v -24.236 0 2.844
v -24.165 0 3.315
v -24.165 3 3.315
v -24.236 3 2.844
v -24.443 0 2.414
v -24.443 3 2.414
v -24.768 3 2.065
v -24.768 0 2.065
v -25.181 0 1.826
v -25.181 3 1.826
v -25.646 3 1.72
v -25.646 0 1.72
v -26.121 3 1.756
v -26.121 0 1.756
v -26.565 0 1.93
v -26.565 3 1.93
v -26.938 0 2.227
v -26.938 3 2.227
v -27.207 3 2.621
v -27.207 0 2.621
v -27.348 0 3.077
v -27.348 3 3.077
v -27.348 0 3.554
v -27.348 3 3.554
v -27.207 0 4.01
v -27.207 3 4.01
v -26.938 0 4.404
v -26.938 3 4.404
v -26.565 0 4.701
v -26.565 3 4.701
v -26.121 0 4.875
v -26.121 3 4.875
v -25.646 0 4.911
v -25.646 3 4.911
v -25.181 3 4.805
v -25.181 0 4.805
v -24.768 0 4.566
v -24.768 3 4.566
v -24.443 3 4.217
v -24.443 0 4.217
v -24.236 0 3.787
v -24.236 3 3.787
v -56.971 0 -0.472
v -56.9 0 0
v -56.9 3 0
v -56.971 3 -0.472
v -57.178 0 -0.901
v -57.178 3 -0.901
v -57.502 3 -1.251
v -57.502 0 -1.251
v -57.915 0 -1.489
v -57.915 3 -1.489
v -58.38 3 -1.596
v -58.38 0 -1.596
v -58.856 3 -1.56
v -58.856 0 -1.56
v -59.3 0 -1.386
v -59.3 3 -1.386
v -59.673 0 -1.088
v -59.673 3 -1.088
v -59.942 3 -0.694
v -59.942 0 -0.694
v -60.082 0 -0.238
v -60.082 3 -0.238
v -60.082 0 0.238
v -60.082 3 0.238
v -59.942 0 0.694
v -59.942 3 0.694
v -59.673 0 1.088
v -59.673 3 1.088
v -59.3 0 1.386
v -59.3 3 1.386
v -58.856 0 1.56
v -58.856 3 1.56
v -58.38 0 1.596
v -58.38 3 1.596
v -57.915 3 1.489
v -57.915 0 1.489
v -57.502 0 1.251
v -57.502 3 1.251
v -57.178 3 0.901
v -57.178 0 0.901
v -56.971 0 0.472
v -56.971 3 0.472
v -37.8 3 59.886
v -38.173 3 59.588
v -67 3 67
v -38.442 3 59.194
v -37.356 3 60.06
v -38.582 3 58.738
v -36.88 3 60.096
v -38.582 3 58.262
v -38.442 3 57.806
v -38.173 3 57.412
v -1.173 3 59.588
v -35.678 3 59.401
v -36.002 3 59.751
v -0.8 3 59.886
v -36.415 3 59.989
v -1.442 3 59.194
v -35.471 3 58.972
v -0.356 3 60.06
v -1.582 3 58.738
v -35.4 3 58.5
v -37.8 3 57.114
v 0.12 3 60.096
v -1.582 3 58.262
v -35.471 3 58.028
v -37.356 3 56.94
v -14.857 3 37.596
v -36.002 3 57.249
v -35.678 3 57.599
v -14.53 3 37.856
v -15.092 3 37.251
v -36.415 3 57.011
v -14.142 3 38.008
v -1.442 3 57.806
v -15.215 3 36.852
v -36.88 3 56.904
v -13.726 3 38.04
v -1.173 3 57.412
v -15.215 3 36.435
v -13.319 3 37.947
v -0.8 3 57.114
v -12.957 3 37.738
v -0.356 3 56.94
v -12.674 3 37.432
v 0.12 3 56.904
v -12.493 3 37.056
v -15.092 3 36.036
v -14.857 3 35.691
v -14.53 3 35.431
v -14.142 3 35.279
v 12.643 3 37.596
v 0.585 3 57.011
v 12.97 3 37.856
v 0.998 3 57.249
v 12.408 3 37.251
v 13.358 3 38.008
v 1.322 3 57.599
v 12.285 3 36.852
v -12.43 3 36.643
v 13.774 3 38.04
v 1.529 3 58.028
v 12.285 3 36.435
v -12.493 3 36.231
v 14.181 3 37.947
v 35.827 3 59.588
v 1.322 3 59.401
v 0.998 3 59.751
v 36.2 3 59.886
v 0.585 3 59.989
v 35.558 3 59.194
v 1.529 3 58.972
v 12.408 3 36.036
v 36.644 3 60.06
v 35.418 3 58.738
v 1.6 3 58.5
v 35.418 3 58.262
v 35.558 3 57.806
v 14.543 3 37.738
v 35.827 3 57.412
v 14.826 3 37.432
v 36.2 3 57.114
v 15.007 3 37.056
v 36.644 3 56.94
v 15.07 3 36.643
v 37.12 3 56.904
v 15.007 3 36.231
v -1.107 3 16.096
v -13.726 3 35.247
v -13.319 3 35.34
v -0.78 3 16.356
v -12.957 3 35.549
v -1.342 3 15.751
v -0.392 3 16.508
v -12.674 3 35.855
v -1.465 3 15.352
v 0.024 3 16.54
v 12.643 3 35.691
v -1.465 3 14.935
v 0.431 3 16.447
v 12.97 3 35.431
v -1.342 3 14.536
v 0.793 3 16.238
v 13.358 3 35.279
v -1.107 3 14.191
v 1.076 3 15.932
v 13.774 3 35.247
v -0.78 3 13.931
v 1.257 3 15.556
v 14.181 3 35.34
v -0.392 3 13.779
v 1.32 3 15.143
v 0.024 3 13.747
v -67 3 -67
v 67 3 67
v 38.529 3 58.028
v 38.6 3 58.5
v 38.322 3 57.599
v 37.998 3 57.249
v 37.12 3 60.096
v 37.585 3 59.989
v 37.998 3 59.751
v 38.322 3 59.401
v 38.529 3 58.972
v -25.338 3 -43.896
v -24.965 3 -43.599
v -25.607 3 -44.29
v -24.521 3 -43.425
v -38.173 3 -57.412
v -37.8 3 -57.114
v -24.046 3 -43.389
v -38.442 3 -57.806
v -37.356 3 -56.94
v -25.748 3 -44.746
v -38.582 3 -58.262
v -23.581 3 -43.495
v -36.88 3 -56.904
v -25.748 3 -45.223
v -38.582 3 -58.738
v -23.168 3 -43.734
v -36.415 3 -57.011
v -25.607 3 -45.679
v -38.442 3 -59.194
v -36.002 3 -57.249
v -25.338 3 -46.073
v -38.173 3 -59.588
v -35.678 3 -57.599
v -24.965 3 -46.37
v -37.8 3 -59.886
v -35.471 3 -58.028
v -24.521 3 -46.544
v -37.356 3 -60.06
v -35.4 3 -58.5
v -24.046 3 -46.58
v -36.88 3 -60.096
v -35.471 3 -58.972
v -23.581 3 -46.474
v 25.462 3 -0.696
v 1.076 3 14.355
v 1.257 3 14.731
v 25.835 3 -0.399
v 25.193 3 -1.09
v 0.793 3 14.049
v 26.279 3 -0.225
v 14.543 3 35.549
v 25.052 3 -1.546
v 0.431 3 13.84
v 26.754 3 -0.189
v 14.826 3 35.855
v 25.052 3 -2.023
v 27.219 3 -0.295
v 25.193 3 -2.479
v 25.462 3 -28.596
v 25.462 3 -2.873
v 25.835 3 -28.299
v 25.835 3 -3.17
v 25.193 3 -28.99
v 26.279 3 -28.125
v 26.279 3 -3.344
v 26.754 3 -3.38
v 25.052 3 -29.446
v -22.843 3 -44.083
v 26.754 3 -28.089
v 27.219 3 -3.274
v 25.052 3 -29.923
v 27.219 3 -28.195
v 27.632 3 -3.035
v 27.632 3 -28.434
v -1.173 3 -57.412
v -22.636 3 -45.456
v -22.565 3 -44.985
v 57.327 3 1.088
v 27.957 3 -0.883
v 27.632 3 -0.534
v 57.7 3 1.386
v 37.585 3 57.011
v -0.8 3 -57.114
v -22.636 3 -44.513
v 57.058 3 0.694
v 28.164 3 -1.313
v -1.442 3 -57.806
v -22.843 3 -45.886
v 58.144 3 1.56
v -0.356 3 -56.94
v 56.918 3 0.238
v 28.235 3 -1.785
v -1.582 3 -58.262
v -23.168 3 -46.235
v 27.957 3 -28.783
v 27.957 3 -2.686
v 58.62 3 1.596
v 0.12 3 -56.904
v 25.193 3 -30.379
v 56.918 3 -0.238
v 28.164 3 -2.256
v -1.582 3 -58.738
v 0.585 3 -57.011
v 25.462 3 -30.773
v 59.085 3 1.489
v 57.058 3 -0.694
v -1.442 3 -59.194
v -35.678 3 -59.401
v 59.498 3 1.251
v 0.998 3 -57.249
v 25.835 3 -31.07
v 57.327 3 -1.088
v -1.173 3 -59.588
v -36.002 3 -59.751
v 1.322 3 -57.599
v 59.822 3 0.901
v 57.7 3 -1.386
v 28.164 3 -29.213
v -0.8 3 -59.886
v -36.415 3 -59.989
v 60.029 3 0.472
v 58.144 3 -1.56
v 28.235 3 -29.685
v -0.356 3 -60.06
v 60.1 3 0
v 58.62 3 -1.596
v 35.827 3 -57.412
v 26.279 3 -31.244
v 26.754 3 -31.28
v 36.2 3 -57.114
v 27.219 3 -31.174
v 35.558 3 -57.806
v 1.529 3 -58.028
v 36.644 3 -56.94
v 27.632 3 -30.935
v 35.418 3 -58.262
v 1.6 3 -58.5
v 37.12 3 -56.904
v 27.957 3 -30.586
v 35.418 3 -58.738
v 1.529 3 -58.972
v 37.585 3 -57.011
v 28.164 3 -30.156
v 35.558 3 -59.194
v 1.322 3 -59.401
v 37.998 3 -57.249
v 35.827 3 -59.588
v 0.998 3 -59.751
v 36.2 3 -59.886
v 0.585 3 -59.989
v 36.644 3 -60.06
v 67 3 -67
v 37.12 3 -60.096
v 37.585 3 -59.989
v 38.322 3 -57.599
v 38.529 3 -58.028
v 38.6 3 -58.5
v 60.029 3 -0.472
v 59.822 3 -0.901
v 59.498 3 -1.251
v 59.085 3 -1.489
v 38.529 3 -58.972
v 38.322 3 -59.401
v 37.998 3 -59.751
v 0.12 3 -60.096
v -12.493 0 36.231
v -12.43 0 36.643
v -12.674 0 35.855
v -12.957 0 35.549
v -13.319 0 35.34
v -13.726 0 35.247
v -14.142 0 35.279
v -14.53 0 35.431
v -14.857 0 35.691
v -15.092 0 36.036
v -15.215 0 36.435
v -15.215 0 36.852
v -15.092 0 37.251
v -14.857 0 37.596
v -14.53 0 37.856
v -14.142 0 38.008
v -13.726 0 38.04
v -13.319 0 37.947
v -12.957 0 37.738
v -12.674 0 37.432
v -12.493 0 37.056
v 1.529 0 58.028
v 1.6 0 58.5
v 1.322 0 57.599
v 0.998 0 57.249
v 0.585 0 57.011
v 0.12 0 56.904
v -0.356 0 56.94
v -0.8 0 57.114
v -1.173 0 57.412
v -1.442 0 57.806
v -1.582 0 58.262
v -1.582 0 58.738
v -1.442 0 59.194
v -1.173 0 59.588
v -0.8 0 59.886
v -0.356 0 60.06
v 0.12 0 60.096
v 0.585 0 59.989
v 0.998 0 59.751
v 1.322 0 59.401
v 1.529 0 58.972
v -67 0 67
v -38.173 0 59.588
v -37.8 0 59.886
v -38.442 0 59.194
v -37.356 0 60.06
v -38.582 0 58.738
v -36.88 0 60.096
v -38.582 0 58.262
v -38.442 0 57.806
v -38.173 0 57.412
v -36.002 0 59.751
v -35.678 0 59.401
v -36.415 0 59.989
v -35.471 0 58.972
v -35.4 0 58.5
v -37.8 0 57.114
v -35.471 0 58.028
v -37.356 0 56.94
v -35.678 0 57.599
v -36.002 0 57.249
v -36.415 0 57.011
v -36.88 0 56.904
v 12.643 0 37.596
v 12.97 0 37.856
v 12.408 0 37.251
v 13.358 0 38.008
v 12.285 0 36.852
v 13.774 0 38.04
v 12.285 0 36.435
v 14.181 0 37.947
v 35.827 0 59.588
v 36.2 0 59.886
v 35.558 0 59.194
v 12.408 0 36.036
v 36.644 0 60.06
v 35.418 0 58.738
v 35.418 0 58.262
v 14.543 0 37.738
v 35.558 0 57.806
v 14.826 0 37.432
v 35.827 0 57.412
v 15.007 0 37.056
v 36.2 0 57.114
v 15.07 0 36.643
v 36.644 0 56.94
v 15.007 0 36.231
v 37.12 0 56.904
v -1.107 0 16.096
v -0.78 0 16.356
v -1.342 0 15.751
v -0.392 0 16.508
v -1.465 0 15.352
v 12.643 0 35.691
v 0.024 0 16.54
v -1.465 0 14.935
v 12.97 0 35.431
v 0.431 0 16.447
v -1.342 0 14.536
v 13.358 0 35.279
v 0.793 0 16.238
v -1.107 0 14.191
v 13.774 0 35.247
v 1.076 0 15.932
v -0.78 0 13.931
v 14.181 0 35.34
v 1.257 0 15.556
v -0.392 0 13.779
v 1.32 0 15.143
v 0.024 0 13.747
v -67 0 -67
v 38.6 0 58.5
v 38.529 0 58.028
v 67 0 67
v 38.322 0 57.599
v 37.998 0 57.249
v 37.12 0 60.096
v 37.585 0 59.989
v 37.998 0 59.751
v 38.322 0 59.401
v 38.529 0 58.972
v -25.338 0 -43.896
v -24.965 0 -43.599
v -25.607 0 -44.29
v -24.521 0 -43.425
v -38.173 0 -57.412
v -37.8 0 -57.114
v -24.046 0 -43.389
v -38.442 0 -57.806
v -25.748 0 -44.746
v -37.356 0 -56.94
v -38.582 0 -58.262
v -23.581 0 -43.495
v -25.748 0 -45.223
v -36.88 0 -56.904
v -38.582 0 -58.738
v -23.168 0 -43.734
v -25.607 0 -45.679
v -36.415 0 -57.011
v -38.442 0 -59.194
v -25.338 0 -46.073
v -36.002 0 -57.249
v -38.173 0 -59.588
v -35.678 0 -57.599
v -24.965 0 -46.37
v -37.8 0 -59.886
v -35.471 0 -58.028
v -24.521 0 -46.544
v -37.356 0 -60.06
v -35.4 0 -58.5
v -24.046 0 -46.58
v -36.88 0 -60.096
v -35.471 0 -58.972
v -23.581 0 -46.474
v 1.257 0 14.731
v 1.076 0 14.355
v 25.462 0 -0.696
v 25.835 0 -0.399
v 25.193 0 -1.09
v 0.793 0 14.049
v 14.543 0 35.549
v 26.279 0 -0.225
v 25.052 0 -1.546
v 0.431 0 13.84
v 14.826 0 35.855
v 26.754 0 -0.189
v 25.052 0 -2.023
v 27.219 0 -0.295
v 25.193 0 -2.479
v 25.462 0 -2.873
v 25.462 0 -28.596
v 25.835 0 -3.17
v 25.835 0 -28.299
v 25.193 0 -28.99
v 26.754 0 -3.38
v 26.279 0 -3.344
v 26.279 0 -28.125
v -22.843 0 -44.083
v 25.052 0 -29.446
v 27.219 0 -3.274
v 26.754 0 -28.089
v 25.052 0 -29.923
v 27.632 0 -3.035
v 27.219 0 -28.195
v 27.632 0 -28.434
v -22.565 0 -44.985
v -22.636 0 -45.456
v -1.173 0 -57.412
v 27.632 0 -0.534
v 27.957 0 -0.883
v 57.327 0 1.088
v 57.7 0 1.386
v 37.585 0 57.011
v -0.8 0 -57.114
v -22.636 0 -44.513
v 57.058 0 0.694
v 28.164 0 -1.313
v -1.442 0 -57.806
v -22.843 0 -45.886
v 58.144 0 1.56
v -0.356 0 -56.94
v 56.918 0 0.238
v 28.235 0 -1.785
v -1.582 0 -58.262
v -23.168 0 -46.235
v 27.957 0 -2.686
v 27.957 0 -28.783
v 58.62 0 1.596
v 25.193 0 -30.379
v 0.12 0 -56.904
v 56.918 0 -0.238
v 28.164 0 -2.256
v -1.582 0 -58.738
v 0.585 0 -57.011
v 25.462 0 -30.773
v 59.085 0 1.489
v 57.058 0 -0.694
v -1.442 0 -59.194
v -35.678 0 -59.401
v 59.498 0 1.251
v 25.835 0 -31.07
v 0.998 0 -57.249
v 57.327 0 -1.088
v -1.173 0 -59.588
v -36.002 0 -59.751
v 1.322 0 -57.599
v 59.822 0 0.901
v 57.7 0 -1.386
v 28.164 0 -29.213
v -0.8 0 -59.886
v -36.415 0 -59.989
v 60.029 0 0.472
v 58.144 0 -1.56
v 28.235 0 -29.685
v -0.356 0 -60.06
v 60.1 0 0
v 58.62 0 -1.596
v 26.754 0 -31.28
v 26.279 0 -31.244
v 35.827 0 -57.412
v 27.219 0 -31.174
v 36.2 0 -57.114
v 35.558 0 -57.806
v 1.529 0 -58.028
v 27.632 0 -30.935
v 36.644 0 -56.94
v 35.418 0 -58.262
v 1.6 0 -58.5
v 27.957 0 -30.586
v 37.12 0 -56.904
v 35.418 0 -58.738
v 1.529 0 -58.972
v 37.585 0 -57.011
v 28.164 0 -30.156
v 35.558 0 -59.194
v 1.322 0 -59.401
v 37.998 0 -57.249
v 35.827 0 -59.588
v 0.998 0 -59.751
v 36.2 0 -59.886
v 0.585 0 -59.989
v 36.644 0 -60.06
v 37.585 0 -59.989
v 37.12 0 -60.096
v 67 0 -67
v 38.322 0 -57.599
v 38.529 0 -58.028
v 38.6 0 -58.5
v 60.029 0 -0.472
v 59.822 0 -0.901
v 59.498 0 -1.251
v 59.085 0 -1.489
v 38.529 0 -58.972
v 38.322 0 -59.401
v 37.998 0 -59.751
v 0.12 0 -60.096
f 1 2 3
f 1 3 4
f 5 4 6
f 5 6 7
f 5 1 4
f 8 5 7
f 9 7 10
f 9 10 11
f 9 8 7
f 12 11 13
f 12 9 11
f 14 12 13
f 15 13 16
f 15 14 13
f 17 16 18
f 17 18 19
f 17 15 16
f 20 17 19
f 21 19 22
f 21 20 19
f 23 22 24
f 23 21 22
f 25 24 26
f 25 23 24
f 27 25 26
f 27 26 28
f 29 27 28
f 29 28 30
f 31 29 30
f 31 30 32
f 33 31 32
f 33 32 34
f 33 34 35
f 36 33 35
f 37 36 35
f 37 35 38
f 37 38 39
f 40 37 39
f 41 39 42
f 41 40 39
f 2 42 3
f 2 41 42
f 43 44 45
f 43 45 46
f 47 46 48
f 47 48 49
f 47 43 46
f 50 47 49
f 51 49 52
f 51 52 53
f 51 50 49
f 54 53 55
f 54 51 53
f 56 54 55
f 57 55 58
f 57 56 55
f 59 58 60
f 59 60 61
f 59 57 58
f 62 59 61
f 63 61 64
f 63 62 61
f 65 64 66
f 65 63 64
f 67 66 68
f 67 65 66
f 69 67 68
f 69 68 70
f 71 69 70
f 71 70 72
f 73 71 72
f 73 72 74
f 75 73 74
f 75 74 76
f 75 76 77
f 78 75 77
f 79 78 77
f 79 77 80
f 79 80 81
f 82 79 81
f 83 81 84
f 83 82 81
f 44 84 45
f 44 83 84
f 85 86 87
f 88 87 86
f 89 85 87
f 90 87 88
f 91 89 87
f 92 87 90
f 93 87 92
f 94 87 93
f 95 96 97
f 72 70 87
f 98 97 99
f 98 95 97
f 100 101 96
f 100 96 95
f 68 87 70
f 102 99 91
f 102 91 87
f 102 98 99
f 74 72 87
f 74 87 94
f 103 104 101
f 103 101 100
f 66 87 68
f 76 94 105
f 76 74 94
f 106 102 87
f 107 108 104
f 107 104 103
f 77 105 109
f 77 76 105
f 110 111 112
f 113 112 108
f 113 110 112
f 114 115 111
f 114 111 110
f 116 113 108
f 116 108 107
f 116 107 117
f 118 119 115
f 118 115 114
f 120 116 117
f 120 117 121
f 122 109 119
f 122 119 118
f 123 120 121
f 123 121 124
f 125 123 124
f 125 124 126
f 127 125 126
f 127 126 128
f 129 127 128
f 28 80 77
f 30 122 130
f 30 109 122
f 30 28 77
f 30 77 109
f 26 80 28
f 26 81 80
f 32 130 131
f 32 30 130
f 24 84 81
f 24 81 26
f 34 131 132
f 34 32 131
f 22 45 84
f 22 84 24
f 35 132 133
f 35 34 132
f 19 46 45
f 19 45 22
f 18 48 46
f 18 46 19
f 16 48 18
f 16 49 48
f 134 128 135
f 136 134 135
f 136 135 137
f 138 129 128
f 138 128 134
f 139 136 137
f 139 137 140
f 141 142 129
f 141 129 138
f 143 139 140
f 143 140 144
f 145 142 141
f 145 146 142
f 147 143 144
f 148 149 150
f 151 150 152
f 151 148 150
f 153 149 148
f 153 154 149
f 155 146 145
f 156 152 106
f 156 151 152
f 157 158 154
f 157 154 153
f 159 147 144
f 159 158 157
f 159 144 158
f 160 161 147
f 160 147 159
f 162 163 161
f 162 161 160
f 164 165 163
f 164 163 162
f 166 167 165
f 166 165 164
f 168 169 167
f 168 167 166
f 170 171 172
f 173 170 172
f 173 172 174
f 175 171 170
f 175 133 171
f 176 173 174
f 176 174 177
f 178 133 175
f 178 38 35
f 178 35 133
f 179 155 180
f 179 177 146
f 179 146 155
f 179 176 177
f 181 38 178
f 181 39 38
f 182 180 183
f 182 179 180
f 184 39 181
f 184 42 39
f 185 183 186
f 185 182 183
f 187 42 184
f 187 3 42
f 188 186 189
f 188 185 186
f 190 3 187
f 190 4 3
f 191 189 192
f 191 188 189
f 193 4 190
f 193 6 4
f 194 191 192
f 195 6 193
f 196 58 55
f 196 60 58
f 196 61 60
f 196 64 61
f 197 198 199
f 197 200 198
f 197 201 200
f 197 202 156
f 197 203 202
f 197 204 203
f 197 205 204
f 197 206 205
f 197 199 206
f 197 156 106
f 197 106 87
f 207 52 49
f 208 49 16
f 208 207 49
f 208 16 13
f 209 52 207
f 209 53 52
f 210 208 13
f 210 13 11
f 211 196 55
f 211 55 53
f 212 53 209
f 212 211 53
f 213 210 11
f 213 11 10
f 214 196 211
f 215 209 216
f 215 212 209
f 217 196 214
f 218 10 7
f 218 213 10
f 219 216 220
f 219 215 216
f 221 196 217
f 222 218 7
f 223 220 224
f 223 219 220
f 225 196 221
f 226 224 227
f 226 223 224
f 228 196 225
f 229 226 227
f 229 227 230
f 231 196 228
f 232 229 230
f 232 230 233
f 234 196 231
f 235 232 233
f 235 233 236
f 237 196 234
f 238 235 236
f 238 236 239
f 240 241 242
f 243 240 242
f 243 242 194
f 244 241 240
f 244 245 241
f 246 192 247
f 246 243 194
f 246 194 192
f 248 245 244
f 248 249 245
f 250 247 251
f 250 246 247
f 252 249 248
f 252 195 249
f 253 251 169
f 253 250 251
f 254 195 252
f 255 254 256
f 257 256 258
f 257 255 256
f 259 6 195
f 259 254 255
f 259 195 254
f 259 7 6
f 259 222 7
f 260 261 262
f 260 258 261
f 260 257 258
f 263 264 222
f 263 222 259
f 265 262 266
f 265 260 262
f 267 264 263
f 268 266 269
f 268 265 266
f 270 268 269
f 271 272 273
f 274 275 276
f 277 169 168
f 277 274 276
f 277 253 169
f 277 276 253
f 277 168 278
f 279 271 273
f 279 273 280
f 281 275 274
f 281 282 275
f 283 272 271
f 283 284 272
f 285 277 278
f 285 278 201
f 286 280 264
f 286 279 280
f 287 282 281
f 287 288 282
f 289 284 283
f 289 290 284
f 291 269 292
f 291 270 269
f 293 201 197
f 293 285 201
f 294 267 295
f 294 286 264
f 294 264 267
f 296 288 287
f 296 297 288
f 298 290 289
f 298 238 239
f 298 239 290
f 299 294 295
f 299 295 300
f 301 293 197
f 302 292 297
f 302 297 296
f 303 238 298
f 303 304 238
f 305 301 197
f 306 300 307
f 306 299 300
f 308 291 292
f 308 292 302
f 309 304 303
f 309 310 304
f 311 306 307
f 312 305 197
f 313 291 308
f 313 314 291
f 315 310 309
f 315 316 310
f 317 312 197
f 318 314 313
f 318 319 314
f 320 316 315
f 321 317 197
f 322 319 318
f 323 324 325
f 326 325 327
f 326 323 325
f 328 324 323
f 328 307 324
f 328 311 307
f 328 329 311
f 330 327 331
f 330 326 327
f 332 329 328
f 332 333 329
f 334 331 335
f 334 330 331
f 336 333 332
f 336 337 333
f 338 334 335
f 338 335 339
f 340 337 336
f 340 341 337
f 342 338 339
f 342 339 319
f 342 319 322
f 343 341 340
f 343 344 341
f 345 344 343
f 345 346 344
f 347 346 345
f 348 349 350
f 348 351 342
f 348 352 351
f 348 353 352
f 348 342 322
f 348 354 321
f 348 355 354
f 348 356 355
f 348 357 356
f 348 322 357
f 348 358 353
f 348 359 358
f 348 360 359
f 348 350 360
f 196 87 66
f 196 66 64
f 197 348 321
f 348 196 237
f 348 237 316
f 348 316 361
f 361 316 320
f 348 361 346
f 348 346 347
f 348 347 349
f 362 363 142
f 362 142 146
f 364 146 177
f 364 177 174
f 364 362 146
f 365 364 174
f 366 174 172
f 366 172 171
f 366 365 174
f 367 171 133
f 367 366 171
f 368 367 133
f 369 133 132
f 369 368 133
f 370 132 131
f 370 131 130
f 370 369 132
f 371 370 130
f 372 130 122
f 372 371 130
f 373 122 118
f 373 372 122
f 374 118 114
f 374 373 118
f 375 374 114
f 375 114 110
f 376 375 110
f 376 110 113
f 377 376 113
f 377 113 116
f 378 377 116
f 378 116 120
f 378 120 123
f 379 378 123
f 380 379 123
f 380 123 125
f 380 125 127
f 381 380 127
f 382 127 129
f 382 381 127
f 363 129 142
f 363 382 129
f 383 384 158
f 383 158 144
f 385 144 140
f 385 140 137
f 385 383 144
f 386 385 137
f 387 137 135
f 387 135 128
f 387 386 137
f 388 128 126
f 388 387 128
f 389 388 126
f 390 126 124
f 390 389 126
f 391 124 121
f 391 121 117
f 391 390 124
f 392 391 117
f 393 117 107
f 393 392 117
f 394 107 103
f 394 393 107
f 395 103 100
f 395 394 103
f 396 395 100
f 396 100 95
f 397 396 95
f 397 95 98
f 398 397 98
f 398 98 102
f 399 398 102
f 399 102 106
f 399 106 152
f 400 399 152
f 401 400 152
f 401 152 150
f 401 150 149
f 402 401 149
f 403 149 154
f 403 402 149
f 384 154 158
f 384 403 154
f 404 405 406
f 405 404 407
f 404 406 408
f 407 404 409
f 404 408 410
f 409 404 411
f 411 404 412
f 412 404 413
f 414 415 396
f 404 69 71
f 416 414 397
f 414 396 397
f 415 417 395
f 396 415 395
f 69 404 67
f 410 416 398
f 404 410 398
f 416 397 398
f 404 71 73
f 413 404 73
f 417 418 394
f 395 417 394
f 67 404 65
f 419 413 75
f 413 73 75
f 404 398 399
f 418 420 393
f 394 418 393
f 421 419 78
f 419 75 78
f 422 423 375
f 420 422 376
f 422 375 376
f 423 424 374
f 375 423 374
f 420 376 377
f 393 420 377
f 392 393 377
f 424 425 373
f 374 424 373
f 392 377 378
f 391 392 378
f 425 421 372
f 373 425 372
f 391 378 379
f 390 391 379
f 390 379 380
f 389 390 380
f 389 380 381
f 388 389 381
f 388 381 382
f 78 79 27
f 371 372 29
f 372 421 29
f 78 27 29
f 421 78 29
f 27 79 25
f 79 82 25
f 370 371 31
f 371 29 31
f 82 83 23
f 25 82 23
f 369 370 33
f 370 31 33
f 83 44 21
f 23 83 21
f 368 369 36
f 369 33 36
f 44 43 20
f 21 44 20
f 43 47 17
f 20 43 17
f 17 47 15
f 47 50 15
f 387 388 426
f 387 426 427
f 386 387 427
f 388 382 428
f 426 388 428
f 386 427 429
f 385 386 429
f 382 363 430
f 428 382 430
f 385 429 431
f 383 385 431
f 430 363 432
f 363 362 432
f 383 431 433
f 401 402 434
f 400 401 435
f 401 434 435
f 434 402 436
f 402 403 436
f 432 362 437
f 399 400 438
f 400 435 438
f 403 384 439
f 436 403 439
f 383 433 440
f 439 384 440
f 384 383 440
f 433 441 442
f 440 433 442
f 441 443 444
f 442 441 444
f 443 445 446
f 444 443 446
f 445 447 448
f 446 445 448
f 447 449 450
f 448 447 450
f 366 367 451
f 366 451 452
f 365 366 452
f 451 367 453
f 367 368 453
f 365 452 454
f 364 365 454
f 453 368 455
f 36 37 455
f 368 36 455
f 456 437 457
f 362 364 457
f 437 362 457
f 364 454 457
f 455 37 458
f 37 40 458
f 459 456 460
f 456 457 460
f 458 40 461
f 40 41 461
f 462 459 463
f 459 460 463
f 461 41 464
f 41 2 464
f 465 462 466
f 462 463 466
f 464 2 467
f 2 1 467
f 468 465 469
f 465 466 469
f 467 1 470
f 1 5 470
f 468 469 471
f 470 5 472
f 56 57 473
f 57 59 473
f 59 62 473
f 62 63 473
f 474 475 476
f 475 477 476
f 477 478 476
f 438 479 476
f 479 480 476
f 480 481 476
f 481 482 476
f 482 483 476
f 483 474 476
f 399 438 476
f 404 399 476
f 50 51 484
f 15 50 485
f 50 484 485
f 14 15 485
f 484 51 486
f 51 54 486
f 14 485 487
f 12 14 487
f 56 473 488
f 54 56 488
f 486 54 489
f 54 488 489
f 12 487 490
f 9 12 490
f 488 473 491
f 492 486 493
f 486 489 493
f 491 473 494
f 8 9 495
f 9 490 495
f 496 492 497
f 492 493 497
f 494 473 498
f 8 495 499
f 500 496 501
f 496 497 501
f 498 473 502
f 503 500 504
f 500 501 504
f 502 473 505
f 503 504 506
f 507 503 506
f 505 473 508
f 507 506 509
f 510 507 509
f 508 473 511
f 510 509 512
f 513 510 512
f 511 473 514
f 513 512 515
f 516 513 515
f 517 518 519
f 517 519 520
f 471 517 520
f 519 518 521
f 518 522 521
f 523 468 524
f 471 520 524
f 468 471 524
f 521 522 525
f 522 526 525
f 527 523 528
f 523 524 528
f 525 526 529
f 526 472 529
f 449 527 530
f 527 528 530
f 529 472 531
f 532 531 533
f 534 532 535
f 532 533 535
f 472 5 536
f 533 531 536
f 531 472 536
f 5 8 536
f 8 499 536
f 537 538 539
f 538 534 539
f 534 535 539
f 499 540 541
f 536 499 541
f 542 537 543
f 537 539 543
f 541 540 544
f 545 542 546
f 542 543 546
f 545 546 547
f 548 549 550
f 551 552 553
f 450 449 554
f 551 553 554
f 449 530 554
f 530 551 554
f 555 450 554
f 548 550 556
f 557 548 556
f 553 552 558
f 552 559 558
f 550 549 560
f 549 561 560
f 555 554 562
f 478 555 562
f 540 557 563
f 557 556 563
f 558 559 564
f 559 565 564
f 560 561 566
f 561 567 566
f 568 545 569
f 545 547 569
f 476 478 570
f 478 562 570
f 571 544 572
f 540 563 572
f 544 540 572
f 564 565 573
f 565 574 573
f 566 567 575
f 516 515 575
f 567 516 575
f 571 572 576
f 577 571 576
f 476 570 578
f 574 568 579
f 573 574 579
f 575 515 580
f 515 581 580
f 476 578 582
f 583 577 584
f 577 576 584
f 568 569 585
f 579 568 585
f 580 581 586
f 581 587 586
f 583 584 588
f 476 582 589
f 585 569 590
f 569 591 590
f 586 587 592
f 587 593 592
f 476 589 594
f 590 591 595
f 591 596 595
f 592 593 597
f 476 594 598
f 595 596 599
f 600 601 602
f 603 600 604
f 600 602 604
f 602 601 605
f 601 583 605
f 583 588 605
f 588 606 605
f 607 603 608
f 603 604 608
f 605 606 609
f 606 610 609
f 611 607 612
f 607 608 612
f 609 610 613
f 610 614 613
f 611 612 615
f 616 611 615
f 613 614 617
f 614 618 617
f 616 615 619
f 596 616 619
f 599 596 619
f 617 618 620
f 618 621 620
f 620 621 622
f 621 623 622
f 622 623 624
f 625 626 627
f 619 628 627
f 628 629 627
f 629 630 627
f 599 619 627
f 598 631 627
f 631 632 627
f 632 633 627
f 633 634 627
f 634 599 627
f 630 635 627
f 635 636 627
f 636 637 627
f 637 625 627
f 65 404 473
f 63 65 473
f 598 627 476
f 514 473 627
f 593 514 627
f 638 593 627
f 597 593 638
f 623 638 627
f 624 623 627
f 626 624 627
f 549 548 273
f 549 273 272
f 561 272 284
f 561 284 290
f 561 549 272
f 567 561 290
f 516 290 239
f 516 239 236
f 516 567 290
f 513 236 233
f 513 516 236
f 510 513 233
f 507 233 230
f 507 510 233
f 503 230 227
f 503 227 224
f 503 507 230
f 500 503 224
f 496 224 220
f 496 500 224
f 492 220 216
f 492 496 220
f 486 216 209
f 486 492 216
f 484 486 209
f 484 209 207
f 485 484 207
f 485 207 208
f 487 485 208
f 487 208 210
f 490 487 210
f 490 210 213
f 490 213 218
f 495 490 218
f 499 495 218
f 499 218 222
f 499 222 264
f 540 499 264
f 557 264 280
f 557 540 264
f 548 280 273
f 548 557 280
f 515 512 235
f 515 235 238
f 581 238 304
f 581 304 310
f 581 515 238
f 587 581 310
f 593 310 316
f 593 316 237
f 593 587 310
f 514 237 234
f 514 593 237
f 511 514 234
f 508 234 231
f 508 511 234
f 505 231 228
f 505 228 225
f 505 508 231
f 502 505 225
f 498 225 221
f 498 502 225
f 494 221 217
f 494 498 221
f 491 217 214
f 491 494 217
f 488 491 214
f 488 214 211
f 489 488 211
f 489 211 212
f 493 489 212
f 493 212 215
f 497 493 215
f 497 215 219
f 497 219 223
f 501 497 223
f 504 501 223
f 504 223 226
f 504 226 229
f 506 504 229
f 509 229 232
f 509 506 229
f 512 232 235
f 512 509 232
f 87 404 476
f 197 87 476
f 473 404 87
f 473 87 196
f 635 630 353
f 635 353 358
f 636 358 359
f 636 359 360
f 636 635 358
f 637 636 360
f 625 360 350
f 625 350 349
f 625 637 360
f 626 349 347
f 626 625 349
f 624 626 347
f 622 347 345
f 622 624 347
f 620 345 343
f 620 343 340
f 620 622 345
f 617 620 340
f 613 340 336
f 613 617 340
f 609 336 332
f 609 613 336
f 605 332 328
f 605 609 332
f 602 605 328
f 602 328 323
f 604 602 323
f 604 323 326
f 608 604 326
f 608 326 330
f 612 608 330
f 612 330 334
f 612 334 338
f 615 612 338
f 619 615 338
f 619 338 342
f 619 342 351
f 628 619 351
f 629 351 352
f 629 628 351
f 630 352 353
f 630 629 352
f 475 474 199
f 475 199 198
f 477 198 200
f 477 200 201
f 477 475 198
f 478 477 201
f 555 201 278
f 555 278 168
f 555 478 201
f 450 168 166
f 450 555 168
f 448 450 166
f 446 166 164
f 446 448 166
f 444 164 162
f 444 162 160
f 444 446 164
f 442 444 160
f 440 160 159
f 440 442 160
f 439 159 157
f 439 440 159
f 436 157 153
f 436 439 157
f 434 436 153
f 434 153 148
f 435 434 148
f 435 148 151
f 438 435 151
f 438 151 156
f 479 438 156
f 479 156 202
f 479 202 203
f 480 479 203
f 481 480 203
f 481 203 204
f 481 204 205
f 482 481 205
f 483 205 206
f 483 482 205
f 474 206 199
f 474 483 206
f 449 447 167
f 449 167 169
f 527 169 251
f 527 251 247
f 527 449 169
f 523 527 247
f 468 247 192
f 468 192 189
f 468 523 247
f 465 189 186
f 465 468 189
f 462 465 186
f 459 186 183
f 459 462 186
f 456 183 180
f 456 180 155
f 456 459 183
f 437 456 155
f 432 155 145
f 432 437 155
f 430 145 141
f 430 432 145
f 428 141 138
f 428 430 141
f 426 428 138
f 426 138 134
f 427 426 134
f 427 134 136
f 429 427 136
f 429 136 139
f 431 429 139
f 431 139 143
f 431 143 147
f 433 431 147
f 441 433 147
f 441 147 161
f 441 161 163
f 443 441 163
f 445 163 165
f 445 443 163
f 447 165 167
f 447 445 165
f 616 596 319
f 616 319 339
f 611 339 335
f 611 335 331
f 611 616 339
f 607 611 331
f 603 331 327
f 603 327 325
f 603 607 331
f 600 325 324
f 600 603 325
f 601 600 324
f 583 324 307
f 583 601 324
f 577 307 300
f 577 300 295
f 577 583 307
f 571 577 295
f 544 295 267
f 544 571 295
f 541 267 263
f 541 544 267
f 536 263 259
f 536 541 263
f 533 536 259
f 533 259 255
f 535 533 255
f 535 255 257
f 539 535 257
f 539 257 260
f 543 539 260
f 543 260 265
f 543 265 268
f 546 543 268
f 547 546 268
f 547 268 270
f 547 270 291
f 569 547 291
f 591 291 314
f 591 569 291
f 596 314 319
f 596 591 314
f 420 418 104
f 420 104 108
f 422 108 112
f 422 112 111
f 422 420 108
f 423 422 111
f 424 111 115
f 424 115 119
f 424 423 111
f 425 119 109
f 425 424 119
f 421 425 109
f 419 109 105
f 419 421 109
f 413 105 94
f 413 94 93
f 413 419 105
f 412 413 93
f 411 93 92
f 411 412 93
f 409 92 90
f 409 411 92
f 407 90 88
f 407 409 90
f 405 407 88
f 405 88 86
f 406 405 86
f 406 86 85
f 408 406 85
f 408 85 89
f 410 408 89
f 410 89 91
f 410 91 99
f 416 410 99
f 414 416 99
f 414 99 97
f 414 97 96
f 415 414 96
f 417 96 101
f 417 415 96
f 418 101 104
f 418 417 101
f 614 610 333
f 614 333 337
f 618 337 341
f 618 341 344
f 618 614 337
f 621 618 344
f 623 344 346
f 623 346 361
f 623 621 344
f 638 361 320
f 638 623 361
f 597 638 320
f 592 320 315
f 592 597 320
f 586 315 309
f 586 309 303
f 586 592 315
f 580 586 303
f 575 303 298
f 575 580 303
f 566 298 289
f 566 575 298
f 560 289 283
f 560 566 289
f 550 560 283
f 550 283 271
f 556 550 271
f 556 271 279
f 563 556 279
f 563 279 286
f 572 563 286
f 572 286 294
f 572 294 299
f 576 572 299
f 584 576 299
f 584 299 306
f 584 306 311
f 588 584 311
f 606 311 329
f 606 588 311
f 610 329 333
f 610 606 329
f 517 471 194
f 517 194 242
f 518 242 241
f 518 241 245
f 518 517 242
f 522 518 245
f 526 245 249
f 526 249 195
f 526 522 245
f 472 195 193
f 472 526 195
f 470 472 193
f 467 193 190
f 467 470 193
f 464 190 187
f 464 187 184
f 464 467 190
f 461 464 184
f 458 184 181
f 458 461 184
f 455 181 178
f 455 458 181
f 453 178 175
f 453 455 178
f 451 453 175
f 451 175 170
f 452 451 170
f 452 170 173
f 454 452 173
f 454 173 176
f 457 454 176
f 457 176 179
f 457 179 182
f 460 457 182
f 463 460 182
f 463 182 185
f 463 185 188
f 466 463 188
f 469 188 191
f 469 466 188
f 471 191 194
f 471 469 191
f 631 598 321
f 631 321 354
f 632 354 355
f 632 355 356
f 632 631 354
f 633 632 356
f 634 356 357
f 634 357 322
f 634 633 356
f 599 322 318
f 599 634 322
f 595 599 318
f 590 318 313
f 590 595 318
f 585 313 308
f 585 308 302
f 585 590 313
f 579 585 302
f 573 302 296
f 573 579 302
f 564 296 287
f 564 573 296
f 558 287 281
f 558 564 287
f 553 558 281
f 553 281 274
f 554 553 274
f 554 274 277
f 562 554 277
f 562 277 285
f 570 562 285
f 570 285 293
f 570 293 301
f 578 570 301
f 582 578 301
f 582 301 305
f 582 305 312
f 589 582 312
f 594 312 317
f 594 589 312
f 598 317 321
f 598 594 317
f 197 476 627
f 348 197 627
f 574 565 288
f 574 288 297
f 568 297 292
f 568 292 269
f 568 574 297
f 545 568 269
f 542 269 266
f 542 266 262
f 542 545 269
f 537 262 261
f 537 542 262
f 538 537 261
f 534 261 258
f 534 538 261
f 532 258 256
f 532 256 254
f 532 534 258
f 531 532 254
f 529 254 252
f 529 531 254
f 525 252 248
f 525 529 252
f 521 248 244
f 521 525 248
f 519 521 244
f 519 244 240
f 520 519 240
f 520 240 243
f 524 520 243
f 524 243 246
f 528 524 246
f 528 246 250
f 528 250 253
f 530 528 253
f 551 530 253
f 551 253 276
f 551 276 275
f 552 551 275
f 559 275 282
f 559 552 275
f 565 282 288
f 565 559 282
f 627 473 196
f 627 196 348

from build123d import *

# Parameters (mm, degrees)
SKETCH2_W           = 134
SKETCH2_H           = 134
SKETCH2_R           = 1.4
SKETCH2_R_2         = 1.6
BOSS_EXTRUDE2_DEPTH = 3


with BuildPart() as part:
    # Sketch2 → Boss-Extrude2 (new body)
    with BuildSketch(Plane(origin=(0, 0, 0), x_dir=(1, 0, 0), z_dir=(0, 1, 0))):
        Rectangle(SKETCH2_W, SKETCH2_H)
        with Locations((-0.080384087, -15.14345336)):
            Circle(SKETCH2_R, mode=Mode.SUBTRACT)
        with Locations((-13.830384087, -36.64345336)):
            Circle(SKETCH2_R, mode=Mode.SUBTRACT)
        with Locations((13.669615913, -36.64345336)):
            Circle(SKETCH2_R, mode=Mode.SUBTRACT)
        with Locations((-24.165395582, 44.984548377)):
            Circle(SKETCH2_R_2, mode=Mode.SUBTRACT)
        with Locations((-25.765395582, -3.315451623)):
            Circle(SKETCH2_R_2, mode=Mode.SUBTRACT)
        with Locations((26.634604418, 29.684548377)):
            Circle(SKETCH2_R_2, mode=Mode.SUBTRACT)
        with Locations((26.634604418, 1.784548377)):
            Circle(SKETCH2_R_2, mode=Mode.SUBTRACT)
        with Locations((0, 58.5)):
            Circle(SKETCH2_R_2, mode=Mode.SUBTRACT)
        with Locations((-58.5, 0)):
            Circle(SKETCH2_R_2, mode=Mode.SUBTRACT)
        with Locations((0, -58.5)):
            Circle(SKETCH2_R_2, mode=Mode.SUBTRACT)
        with Locations((58.5, 0)):
            Circle(SKETCH2_R_2, mode=Mode.SUBTRACT)
        with Locations((-37, 58.5)):
            Circle(SKETCH2_R_2, mode=Mode.SUBTRACT)
        with Locations((37, 58.5)):
            Circle(SKETCH2_R_2, mode=Mode.SUBTRACT)
        with Locations((-37, -58.5)):
            Circle(SKETCH2_R_2, mode=Mode.SUBTRACT)
        with Locations((37, -58.5)):
            Circle(SKETCH2_R_2, mode=Mode.SUBTRACT)
    extrude(amount=BOSS_EXTRUDE2_DEPTH)


solid = part.part
